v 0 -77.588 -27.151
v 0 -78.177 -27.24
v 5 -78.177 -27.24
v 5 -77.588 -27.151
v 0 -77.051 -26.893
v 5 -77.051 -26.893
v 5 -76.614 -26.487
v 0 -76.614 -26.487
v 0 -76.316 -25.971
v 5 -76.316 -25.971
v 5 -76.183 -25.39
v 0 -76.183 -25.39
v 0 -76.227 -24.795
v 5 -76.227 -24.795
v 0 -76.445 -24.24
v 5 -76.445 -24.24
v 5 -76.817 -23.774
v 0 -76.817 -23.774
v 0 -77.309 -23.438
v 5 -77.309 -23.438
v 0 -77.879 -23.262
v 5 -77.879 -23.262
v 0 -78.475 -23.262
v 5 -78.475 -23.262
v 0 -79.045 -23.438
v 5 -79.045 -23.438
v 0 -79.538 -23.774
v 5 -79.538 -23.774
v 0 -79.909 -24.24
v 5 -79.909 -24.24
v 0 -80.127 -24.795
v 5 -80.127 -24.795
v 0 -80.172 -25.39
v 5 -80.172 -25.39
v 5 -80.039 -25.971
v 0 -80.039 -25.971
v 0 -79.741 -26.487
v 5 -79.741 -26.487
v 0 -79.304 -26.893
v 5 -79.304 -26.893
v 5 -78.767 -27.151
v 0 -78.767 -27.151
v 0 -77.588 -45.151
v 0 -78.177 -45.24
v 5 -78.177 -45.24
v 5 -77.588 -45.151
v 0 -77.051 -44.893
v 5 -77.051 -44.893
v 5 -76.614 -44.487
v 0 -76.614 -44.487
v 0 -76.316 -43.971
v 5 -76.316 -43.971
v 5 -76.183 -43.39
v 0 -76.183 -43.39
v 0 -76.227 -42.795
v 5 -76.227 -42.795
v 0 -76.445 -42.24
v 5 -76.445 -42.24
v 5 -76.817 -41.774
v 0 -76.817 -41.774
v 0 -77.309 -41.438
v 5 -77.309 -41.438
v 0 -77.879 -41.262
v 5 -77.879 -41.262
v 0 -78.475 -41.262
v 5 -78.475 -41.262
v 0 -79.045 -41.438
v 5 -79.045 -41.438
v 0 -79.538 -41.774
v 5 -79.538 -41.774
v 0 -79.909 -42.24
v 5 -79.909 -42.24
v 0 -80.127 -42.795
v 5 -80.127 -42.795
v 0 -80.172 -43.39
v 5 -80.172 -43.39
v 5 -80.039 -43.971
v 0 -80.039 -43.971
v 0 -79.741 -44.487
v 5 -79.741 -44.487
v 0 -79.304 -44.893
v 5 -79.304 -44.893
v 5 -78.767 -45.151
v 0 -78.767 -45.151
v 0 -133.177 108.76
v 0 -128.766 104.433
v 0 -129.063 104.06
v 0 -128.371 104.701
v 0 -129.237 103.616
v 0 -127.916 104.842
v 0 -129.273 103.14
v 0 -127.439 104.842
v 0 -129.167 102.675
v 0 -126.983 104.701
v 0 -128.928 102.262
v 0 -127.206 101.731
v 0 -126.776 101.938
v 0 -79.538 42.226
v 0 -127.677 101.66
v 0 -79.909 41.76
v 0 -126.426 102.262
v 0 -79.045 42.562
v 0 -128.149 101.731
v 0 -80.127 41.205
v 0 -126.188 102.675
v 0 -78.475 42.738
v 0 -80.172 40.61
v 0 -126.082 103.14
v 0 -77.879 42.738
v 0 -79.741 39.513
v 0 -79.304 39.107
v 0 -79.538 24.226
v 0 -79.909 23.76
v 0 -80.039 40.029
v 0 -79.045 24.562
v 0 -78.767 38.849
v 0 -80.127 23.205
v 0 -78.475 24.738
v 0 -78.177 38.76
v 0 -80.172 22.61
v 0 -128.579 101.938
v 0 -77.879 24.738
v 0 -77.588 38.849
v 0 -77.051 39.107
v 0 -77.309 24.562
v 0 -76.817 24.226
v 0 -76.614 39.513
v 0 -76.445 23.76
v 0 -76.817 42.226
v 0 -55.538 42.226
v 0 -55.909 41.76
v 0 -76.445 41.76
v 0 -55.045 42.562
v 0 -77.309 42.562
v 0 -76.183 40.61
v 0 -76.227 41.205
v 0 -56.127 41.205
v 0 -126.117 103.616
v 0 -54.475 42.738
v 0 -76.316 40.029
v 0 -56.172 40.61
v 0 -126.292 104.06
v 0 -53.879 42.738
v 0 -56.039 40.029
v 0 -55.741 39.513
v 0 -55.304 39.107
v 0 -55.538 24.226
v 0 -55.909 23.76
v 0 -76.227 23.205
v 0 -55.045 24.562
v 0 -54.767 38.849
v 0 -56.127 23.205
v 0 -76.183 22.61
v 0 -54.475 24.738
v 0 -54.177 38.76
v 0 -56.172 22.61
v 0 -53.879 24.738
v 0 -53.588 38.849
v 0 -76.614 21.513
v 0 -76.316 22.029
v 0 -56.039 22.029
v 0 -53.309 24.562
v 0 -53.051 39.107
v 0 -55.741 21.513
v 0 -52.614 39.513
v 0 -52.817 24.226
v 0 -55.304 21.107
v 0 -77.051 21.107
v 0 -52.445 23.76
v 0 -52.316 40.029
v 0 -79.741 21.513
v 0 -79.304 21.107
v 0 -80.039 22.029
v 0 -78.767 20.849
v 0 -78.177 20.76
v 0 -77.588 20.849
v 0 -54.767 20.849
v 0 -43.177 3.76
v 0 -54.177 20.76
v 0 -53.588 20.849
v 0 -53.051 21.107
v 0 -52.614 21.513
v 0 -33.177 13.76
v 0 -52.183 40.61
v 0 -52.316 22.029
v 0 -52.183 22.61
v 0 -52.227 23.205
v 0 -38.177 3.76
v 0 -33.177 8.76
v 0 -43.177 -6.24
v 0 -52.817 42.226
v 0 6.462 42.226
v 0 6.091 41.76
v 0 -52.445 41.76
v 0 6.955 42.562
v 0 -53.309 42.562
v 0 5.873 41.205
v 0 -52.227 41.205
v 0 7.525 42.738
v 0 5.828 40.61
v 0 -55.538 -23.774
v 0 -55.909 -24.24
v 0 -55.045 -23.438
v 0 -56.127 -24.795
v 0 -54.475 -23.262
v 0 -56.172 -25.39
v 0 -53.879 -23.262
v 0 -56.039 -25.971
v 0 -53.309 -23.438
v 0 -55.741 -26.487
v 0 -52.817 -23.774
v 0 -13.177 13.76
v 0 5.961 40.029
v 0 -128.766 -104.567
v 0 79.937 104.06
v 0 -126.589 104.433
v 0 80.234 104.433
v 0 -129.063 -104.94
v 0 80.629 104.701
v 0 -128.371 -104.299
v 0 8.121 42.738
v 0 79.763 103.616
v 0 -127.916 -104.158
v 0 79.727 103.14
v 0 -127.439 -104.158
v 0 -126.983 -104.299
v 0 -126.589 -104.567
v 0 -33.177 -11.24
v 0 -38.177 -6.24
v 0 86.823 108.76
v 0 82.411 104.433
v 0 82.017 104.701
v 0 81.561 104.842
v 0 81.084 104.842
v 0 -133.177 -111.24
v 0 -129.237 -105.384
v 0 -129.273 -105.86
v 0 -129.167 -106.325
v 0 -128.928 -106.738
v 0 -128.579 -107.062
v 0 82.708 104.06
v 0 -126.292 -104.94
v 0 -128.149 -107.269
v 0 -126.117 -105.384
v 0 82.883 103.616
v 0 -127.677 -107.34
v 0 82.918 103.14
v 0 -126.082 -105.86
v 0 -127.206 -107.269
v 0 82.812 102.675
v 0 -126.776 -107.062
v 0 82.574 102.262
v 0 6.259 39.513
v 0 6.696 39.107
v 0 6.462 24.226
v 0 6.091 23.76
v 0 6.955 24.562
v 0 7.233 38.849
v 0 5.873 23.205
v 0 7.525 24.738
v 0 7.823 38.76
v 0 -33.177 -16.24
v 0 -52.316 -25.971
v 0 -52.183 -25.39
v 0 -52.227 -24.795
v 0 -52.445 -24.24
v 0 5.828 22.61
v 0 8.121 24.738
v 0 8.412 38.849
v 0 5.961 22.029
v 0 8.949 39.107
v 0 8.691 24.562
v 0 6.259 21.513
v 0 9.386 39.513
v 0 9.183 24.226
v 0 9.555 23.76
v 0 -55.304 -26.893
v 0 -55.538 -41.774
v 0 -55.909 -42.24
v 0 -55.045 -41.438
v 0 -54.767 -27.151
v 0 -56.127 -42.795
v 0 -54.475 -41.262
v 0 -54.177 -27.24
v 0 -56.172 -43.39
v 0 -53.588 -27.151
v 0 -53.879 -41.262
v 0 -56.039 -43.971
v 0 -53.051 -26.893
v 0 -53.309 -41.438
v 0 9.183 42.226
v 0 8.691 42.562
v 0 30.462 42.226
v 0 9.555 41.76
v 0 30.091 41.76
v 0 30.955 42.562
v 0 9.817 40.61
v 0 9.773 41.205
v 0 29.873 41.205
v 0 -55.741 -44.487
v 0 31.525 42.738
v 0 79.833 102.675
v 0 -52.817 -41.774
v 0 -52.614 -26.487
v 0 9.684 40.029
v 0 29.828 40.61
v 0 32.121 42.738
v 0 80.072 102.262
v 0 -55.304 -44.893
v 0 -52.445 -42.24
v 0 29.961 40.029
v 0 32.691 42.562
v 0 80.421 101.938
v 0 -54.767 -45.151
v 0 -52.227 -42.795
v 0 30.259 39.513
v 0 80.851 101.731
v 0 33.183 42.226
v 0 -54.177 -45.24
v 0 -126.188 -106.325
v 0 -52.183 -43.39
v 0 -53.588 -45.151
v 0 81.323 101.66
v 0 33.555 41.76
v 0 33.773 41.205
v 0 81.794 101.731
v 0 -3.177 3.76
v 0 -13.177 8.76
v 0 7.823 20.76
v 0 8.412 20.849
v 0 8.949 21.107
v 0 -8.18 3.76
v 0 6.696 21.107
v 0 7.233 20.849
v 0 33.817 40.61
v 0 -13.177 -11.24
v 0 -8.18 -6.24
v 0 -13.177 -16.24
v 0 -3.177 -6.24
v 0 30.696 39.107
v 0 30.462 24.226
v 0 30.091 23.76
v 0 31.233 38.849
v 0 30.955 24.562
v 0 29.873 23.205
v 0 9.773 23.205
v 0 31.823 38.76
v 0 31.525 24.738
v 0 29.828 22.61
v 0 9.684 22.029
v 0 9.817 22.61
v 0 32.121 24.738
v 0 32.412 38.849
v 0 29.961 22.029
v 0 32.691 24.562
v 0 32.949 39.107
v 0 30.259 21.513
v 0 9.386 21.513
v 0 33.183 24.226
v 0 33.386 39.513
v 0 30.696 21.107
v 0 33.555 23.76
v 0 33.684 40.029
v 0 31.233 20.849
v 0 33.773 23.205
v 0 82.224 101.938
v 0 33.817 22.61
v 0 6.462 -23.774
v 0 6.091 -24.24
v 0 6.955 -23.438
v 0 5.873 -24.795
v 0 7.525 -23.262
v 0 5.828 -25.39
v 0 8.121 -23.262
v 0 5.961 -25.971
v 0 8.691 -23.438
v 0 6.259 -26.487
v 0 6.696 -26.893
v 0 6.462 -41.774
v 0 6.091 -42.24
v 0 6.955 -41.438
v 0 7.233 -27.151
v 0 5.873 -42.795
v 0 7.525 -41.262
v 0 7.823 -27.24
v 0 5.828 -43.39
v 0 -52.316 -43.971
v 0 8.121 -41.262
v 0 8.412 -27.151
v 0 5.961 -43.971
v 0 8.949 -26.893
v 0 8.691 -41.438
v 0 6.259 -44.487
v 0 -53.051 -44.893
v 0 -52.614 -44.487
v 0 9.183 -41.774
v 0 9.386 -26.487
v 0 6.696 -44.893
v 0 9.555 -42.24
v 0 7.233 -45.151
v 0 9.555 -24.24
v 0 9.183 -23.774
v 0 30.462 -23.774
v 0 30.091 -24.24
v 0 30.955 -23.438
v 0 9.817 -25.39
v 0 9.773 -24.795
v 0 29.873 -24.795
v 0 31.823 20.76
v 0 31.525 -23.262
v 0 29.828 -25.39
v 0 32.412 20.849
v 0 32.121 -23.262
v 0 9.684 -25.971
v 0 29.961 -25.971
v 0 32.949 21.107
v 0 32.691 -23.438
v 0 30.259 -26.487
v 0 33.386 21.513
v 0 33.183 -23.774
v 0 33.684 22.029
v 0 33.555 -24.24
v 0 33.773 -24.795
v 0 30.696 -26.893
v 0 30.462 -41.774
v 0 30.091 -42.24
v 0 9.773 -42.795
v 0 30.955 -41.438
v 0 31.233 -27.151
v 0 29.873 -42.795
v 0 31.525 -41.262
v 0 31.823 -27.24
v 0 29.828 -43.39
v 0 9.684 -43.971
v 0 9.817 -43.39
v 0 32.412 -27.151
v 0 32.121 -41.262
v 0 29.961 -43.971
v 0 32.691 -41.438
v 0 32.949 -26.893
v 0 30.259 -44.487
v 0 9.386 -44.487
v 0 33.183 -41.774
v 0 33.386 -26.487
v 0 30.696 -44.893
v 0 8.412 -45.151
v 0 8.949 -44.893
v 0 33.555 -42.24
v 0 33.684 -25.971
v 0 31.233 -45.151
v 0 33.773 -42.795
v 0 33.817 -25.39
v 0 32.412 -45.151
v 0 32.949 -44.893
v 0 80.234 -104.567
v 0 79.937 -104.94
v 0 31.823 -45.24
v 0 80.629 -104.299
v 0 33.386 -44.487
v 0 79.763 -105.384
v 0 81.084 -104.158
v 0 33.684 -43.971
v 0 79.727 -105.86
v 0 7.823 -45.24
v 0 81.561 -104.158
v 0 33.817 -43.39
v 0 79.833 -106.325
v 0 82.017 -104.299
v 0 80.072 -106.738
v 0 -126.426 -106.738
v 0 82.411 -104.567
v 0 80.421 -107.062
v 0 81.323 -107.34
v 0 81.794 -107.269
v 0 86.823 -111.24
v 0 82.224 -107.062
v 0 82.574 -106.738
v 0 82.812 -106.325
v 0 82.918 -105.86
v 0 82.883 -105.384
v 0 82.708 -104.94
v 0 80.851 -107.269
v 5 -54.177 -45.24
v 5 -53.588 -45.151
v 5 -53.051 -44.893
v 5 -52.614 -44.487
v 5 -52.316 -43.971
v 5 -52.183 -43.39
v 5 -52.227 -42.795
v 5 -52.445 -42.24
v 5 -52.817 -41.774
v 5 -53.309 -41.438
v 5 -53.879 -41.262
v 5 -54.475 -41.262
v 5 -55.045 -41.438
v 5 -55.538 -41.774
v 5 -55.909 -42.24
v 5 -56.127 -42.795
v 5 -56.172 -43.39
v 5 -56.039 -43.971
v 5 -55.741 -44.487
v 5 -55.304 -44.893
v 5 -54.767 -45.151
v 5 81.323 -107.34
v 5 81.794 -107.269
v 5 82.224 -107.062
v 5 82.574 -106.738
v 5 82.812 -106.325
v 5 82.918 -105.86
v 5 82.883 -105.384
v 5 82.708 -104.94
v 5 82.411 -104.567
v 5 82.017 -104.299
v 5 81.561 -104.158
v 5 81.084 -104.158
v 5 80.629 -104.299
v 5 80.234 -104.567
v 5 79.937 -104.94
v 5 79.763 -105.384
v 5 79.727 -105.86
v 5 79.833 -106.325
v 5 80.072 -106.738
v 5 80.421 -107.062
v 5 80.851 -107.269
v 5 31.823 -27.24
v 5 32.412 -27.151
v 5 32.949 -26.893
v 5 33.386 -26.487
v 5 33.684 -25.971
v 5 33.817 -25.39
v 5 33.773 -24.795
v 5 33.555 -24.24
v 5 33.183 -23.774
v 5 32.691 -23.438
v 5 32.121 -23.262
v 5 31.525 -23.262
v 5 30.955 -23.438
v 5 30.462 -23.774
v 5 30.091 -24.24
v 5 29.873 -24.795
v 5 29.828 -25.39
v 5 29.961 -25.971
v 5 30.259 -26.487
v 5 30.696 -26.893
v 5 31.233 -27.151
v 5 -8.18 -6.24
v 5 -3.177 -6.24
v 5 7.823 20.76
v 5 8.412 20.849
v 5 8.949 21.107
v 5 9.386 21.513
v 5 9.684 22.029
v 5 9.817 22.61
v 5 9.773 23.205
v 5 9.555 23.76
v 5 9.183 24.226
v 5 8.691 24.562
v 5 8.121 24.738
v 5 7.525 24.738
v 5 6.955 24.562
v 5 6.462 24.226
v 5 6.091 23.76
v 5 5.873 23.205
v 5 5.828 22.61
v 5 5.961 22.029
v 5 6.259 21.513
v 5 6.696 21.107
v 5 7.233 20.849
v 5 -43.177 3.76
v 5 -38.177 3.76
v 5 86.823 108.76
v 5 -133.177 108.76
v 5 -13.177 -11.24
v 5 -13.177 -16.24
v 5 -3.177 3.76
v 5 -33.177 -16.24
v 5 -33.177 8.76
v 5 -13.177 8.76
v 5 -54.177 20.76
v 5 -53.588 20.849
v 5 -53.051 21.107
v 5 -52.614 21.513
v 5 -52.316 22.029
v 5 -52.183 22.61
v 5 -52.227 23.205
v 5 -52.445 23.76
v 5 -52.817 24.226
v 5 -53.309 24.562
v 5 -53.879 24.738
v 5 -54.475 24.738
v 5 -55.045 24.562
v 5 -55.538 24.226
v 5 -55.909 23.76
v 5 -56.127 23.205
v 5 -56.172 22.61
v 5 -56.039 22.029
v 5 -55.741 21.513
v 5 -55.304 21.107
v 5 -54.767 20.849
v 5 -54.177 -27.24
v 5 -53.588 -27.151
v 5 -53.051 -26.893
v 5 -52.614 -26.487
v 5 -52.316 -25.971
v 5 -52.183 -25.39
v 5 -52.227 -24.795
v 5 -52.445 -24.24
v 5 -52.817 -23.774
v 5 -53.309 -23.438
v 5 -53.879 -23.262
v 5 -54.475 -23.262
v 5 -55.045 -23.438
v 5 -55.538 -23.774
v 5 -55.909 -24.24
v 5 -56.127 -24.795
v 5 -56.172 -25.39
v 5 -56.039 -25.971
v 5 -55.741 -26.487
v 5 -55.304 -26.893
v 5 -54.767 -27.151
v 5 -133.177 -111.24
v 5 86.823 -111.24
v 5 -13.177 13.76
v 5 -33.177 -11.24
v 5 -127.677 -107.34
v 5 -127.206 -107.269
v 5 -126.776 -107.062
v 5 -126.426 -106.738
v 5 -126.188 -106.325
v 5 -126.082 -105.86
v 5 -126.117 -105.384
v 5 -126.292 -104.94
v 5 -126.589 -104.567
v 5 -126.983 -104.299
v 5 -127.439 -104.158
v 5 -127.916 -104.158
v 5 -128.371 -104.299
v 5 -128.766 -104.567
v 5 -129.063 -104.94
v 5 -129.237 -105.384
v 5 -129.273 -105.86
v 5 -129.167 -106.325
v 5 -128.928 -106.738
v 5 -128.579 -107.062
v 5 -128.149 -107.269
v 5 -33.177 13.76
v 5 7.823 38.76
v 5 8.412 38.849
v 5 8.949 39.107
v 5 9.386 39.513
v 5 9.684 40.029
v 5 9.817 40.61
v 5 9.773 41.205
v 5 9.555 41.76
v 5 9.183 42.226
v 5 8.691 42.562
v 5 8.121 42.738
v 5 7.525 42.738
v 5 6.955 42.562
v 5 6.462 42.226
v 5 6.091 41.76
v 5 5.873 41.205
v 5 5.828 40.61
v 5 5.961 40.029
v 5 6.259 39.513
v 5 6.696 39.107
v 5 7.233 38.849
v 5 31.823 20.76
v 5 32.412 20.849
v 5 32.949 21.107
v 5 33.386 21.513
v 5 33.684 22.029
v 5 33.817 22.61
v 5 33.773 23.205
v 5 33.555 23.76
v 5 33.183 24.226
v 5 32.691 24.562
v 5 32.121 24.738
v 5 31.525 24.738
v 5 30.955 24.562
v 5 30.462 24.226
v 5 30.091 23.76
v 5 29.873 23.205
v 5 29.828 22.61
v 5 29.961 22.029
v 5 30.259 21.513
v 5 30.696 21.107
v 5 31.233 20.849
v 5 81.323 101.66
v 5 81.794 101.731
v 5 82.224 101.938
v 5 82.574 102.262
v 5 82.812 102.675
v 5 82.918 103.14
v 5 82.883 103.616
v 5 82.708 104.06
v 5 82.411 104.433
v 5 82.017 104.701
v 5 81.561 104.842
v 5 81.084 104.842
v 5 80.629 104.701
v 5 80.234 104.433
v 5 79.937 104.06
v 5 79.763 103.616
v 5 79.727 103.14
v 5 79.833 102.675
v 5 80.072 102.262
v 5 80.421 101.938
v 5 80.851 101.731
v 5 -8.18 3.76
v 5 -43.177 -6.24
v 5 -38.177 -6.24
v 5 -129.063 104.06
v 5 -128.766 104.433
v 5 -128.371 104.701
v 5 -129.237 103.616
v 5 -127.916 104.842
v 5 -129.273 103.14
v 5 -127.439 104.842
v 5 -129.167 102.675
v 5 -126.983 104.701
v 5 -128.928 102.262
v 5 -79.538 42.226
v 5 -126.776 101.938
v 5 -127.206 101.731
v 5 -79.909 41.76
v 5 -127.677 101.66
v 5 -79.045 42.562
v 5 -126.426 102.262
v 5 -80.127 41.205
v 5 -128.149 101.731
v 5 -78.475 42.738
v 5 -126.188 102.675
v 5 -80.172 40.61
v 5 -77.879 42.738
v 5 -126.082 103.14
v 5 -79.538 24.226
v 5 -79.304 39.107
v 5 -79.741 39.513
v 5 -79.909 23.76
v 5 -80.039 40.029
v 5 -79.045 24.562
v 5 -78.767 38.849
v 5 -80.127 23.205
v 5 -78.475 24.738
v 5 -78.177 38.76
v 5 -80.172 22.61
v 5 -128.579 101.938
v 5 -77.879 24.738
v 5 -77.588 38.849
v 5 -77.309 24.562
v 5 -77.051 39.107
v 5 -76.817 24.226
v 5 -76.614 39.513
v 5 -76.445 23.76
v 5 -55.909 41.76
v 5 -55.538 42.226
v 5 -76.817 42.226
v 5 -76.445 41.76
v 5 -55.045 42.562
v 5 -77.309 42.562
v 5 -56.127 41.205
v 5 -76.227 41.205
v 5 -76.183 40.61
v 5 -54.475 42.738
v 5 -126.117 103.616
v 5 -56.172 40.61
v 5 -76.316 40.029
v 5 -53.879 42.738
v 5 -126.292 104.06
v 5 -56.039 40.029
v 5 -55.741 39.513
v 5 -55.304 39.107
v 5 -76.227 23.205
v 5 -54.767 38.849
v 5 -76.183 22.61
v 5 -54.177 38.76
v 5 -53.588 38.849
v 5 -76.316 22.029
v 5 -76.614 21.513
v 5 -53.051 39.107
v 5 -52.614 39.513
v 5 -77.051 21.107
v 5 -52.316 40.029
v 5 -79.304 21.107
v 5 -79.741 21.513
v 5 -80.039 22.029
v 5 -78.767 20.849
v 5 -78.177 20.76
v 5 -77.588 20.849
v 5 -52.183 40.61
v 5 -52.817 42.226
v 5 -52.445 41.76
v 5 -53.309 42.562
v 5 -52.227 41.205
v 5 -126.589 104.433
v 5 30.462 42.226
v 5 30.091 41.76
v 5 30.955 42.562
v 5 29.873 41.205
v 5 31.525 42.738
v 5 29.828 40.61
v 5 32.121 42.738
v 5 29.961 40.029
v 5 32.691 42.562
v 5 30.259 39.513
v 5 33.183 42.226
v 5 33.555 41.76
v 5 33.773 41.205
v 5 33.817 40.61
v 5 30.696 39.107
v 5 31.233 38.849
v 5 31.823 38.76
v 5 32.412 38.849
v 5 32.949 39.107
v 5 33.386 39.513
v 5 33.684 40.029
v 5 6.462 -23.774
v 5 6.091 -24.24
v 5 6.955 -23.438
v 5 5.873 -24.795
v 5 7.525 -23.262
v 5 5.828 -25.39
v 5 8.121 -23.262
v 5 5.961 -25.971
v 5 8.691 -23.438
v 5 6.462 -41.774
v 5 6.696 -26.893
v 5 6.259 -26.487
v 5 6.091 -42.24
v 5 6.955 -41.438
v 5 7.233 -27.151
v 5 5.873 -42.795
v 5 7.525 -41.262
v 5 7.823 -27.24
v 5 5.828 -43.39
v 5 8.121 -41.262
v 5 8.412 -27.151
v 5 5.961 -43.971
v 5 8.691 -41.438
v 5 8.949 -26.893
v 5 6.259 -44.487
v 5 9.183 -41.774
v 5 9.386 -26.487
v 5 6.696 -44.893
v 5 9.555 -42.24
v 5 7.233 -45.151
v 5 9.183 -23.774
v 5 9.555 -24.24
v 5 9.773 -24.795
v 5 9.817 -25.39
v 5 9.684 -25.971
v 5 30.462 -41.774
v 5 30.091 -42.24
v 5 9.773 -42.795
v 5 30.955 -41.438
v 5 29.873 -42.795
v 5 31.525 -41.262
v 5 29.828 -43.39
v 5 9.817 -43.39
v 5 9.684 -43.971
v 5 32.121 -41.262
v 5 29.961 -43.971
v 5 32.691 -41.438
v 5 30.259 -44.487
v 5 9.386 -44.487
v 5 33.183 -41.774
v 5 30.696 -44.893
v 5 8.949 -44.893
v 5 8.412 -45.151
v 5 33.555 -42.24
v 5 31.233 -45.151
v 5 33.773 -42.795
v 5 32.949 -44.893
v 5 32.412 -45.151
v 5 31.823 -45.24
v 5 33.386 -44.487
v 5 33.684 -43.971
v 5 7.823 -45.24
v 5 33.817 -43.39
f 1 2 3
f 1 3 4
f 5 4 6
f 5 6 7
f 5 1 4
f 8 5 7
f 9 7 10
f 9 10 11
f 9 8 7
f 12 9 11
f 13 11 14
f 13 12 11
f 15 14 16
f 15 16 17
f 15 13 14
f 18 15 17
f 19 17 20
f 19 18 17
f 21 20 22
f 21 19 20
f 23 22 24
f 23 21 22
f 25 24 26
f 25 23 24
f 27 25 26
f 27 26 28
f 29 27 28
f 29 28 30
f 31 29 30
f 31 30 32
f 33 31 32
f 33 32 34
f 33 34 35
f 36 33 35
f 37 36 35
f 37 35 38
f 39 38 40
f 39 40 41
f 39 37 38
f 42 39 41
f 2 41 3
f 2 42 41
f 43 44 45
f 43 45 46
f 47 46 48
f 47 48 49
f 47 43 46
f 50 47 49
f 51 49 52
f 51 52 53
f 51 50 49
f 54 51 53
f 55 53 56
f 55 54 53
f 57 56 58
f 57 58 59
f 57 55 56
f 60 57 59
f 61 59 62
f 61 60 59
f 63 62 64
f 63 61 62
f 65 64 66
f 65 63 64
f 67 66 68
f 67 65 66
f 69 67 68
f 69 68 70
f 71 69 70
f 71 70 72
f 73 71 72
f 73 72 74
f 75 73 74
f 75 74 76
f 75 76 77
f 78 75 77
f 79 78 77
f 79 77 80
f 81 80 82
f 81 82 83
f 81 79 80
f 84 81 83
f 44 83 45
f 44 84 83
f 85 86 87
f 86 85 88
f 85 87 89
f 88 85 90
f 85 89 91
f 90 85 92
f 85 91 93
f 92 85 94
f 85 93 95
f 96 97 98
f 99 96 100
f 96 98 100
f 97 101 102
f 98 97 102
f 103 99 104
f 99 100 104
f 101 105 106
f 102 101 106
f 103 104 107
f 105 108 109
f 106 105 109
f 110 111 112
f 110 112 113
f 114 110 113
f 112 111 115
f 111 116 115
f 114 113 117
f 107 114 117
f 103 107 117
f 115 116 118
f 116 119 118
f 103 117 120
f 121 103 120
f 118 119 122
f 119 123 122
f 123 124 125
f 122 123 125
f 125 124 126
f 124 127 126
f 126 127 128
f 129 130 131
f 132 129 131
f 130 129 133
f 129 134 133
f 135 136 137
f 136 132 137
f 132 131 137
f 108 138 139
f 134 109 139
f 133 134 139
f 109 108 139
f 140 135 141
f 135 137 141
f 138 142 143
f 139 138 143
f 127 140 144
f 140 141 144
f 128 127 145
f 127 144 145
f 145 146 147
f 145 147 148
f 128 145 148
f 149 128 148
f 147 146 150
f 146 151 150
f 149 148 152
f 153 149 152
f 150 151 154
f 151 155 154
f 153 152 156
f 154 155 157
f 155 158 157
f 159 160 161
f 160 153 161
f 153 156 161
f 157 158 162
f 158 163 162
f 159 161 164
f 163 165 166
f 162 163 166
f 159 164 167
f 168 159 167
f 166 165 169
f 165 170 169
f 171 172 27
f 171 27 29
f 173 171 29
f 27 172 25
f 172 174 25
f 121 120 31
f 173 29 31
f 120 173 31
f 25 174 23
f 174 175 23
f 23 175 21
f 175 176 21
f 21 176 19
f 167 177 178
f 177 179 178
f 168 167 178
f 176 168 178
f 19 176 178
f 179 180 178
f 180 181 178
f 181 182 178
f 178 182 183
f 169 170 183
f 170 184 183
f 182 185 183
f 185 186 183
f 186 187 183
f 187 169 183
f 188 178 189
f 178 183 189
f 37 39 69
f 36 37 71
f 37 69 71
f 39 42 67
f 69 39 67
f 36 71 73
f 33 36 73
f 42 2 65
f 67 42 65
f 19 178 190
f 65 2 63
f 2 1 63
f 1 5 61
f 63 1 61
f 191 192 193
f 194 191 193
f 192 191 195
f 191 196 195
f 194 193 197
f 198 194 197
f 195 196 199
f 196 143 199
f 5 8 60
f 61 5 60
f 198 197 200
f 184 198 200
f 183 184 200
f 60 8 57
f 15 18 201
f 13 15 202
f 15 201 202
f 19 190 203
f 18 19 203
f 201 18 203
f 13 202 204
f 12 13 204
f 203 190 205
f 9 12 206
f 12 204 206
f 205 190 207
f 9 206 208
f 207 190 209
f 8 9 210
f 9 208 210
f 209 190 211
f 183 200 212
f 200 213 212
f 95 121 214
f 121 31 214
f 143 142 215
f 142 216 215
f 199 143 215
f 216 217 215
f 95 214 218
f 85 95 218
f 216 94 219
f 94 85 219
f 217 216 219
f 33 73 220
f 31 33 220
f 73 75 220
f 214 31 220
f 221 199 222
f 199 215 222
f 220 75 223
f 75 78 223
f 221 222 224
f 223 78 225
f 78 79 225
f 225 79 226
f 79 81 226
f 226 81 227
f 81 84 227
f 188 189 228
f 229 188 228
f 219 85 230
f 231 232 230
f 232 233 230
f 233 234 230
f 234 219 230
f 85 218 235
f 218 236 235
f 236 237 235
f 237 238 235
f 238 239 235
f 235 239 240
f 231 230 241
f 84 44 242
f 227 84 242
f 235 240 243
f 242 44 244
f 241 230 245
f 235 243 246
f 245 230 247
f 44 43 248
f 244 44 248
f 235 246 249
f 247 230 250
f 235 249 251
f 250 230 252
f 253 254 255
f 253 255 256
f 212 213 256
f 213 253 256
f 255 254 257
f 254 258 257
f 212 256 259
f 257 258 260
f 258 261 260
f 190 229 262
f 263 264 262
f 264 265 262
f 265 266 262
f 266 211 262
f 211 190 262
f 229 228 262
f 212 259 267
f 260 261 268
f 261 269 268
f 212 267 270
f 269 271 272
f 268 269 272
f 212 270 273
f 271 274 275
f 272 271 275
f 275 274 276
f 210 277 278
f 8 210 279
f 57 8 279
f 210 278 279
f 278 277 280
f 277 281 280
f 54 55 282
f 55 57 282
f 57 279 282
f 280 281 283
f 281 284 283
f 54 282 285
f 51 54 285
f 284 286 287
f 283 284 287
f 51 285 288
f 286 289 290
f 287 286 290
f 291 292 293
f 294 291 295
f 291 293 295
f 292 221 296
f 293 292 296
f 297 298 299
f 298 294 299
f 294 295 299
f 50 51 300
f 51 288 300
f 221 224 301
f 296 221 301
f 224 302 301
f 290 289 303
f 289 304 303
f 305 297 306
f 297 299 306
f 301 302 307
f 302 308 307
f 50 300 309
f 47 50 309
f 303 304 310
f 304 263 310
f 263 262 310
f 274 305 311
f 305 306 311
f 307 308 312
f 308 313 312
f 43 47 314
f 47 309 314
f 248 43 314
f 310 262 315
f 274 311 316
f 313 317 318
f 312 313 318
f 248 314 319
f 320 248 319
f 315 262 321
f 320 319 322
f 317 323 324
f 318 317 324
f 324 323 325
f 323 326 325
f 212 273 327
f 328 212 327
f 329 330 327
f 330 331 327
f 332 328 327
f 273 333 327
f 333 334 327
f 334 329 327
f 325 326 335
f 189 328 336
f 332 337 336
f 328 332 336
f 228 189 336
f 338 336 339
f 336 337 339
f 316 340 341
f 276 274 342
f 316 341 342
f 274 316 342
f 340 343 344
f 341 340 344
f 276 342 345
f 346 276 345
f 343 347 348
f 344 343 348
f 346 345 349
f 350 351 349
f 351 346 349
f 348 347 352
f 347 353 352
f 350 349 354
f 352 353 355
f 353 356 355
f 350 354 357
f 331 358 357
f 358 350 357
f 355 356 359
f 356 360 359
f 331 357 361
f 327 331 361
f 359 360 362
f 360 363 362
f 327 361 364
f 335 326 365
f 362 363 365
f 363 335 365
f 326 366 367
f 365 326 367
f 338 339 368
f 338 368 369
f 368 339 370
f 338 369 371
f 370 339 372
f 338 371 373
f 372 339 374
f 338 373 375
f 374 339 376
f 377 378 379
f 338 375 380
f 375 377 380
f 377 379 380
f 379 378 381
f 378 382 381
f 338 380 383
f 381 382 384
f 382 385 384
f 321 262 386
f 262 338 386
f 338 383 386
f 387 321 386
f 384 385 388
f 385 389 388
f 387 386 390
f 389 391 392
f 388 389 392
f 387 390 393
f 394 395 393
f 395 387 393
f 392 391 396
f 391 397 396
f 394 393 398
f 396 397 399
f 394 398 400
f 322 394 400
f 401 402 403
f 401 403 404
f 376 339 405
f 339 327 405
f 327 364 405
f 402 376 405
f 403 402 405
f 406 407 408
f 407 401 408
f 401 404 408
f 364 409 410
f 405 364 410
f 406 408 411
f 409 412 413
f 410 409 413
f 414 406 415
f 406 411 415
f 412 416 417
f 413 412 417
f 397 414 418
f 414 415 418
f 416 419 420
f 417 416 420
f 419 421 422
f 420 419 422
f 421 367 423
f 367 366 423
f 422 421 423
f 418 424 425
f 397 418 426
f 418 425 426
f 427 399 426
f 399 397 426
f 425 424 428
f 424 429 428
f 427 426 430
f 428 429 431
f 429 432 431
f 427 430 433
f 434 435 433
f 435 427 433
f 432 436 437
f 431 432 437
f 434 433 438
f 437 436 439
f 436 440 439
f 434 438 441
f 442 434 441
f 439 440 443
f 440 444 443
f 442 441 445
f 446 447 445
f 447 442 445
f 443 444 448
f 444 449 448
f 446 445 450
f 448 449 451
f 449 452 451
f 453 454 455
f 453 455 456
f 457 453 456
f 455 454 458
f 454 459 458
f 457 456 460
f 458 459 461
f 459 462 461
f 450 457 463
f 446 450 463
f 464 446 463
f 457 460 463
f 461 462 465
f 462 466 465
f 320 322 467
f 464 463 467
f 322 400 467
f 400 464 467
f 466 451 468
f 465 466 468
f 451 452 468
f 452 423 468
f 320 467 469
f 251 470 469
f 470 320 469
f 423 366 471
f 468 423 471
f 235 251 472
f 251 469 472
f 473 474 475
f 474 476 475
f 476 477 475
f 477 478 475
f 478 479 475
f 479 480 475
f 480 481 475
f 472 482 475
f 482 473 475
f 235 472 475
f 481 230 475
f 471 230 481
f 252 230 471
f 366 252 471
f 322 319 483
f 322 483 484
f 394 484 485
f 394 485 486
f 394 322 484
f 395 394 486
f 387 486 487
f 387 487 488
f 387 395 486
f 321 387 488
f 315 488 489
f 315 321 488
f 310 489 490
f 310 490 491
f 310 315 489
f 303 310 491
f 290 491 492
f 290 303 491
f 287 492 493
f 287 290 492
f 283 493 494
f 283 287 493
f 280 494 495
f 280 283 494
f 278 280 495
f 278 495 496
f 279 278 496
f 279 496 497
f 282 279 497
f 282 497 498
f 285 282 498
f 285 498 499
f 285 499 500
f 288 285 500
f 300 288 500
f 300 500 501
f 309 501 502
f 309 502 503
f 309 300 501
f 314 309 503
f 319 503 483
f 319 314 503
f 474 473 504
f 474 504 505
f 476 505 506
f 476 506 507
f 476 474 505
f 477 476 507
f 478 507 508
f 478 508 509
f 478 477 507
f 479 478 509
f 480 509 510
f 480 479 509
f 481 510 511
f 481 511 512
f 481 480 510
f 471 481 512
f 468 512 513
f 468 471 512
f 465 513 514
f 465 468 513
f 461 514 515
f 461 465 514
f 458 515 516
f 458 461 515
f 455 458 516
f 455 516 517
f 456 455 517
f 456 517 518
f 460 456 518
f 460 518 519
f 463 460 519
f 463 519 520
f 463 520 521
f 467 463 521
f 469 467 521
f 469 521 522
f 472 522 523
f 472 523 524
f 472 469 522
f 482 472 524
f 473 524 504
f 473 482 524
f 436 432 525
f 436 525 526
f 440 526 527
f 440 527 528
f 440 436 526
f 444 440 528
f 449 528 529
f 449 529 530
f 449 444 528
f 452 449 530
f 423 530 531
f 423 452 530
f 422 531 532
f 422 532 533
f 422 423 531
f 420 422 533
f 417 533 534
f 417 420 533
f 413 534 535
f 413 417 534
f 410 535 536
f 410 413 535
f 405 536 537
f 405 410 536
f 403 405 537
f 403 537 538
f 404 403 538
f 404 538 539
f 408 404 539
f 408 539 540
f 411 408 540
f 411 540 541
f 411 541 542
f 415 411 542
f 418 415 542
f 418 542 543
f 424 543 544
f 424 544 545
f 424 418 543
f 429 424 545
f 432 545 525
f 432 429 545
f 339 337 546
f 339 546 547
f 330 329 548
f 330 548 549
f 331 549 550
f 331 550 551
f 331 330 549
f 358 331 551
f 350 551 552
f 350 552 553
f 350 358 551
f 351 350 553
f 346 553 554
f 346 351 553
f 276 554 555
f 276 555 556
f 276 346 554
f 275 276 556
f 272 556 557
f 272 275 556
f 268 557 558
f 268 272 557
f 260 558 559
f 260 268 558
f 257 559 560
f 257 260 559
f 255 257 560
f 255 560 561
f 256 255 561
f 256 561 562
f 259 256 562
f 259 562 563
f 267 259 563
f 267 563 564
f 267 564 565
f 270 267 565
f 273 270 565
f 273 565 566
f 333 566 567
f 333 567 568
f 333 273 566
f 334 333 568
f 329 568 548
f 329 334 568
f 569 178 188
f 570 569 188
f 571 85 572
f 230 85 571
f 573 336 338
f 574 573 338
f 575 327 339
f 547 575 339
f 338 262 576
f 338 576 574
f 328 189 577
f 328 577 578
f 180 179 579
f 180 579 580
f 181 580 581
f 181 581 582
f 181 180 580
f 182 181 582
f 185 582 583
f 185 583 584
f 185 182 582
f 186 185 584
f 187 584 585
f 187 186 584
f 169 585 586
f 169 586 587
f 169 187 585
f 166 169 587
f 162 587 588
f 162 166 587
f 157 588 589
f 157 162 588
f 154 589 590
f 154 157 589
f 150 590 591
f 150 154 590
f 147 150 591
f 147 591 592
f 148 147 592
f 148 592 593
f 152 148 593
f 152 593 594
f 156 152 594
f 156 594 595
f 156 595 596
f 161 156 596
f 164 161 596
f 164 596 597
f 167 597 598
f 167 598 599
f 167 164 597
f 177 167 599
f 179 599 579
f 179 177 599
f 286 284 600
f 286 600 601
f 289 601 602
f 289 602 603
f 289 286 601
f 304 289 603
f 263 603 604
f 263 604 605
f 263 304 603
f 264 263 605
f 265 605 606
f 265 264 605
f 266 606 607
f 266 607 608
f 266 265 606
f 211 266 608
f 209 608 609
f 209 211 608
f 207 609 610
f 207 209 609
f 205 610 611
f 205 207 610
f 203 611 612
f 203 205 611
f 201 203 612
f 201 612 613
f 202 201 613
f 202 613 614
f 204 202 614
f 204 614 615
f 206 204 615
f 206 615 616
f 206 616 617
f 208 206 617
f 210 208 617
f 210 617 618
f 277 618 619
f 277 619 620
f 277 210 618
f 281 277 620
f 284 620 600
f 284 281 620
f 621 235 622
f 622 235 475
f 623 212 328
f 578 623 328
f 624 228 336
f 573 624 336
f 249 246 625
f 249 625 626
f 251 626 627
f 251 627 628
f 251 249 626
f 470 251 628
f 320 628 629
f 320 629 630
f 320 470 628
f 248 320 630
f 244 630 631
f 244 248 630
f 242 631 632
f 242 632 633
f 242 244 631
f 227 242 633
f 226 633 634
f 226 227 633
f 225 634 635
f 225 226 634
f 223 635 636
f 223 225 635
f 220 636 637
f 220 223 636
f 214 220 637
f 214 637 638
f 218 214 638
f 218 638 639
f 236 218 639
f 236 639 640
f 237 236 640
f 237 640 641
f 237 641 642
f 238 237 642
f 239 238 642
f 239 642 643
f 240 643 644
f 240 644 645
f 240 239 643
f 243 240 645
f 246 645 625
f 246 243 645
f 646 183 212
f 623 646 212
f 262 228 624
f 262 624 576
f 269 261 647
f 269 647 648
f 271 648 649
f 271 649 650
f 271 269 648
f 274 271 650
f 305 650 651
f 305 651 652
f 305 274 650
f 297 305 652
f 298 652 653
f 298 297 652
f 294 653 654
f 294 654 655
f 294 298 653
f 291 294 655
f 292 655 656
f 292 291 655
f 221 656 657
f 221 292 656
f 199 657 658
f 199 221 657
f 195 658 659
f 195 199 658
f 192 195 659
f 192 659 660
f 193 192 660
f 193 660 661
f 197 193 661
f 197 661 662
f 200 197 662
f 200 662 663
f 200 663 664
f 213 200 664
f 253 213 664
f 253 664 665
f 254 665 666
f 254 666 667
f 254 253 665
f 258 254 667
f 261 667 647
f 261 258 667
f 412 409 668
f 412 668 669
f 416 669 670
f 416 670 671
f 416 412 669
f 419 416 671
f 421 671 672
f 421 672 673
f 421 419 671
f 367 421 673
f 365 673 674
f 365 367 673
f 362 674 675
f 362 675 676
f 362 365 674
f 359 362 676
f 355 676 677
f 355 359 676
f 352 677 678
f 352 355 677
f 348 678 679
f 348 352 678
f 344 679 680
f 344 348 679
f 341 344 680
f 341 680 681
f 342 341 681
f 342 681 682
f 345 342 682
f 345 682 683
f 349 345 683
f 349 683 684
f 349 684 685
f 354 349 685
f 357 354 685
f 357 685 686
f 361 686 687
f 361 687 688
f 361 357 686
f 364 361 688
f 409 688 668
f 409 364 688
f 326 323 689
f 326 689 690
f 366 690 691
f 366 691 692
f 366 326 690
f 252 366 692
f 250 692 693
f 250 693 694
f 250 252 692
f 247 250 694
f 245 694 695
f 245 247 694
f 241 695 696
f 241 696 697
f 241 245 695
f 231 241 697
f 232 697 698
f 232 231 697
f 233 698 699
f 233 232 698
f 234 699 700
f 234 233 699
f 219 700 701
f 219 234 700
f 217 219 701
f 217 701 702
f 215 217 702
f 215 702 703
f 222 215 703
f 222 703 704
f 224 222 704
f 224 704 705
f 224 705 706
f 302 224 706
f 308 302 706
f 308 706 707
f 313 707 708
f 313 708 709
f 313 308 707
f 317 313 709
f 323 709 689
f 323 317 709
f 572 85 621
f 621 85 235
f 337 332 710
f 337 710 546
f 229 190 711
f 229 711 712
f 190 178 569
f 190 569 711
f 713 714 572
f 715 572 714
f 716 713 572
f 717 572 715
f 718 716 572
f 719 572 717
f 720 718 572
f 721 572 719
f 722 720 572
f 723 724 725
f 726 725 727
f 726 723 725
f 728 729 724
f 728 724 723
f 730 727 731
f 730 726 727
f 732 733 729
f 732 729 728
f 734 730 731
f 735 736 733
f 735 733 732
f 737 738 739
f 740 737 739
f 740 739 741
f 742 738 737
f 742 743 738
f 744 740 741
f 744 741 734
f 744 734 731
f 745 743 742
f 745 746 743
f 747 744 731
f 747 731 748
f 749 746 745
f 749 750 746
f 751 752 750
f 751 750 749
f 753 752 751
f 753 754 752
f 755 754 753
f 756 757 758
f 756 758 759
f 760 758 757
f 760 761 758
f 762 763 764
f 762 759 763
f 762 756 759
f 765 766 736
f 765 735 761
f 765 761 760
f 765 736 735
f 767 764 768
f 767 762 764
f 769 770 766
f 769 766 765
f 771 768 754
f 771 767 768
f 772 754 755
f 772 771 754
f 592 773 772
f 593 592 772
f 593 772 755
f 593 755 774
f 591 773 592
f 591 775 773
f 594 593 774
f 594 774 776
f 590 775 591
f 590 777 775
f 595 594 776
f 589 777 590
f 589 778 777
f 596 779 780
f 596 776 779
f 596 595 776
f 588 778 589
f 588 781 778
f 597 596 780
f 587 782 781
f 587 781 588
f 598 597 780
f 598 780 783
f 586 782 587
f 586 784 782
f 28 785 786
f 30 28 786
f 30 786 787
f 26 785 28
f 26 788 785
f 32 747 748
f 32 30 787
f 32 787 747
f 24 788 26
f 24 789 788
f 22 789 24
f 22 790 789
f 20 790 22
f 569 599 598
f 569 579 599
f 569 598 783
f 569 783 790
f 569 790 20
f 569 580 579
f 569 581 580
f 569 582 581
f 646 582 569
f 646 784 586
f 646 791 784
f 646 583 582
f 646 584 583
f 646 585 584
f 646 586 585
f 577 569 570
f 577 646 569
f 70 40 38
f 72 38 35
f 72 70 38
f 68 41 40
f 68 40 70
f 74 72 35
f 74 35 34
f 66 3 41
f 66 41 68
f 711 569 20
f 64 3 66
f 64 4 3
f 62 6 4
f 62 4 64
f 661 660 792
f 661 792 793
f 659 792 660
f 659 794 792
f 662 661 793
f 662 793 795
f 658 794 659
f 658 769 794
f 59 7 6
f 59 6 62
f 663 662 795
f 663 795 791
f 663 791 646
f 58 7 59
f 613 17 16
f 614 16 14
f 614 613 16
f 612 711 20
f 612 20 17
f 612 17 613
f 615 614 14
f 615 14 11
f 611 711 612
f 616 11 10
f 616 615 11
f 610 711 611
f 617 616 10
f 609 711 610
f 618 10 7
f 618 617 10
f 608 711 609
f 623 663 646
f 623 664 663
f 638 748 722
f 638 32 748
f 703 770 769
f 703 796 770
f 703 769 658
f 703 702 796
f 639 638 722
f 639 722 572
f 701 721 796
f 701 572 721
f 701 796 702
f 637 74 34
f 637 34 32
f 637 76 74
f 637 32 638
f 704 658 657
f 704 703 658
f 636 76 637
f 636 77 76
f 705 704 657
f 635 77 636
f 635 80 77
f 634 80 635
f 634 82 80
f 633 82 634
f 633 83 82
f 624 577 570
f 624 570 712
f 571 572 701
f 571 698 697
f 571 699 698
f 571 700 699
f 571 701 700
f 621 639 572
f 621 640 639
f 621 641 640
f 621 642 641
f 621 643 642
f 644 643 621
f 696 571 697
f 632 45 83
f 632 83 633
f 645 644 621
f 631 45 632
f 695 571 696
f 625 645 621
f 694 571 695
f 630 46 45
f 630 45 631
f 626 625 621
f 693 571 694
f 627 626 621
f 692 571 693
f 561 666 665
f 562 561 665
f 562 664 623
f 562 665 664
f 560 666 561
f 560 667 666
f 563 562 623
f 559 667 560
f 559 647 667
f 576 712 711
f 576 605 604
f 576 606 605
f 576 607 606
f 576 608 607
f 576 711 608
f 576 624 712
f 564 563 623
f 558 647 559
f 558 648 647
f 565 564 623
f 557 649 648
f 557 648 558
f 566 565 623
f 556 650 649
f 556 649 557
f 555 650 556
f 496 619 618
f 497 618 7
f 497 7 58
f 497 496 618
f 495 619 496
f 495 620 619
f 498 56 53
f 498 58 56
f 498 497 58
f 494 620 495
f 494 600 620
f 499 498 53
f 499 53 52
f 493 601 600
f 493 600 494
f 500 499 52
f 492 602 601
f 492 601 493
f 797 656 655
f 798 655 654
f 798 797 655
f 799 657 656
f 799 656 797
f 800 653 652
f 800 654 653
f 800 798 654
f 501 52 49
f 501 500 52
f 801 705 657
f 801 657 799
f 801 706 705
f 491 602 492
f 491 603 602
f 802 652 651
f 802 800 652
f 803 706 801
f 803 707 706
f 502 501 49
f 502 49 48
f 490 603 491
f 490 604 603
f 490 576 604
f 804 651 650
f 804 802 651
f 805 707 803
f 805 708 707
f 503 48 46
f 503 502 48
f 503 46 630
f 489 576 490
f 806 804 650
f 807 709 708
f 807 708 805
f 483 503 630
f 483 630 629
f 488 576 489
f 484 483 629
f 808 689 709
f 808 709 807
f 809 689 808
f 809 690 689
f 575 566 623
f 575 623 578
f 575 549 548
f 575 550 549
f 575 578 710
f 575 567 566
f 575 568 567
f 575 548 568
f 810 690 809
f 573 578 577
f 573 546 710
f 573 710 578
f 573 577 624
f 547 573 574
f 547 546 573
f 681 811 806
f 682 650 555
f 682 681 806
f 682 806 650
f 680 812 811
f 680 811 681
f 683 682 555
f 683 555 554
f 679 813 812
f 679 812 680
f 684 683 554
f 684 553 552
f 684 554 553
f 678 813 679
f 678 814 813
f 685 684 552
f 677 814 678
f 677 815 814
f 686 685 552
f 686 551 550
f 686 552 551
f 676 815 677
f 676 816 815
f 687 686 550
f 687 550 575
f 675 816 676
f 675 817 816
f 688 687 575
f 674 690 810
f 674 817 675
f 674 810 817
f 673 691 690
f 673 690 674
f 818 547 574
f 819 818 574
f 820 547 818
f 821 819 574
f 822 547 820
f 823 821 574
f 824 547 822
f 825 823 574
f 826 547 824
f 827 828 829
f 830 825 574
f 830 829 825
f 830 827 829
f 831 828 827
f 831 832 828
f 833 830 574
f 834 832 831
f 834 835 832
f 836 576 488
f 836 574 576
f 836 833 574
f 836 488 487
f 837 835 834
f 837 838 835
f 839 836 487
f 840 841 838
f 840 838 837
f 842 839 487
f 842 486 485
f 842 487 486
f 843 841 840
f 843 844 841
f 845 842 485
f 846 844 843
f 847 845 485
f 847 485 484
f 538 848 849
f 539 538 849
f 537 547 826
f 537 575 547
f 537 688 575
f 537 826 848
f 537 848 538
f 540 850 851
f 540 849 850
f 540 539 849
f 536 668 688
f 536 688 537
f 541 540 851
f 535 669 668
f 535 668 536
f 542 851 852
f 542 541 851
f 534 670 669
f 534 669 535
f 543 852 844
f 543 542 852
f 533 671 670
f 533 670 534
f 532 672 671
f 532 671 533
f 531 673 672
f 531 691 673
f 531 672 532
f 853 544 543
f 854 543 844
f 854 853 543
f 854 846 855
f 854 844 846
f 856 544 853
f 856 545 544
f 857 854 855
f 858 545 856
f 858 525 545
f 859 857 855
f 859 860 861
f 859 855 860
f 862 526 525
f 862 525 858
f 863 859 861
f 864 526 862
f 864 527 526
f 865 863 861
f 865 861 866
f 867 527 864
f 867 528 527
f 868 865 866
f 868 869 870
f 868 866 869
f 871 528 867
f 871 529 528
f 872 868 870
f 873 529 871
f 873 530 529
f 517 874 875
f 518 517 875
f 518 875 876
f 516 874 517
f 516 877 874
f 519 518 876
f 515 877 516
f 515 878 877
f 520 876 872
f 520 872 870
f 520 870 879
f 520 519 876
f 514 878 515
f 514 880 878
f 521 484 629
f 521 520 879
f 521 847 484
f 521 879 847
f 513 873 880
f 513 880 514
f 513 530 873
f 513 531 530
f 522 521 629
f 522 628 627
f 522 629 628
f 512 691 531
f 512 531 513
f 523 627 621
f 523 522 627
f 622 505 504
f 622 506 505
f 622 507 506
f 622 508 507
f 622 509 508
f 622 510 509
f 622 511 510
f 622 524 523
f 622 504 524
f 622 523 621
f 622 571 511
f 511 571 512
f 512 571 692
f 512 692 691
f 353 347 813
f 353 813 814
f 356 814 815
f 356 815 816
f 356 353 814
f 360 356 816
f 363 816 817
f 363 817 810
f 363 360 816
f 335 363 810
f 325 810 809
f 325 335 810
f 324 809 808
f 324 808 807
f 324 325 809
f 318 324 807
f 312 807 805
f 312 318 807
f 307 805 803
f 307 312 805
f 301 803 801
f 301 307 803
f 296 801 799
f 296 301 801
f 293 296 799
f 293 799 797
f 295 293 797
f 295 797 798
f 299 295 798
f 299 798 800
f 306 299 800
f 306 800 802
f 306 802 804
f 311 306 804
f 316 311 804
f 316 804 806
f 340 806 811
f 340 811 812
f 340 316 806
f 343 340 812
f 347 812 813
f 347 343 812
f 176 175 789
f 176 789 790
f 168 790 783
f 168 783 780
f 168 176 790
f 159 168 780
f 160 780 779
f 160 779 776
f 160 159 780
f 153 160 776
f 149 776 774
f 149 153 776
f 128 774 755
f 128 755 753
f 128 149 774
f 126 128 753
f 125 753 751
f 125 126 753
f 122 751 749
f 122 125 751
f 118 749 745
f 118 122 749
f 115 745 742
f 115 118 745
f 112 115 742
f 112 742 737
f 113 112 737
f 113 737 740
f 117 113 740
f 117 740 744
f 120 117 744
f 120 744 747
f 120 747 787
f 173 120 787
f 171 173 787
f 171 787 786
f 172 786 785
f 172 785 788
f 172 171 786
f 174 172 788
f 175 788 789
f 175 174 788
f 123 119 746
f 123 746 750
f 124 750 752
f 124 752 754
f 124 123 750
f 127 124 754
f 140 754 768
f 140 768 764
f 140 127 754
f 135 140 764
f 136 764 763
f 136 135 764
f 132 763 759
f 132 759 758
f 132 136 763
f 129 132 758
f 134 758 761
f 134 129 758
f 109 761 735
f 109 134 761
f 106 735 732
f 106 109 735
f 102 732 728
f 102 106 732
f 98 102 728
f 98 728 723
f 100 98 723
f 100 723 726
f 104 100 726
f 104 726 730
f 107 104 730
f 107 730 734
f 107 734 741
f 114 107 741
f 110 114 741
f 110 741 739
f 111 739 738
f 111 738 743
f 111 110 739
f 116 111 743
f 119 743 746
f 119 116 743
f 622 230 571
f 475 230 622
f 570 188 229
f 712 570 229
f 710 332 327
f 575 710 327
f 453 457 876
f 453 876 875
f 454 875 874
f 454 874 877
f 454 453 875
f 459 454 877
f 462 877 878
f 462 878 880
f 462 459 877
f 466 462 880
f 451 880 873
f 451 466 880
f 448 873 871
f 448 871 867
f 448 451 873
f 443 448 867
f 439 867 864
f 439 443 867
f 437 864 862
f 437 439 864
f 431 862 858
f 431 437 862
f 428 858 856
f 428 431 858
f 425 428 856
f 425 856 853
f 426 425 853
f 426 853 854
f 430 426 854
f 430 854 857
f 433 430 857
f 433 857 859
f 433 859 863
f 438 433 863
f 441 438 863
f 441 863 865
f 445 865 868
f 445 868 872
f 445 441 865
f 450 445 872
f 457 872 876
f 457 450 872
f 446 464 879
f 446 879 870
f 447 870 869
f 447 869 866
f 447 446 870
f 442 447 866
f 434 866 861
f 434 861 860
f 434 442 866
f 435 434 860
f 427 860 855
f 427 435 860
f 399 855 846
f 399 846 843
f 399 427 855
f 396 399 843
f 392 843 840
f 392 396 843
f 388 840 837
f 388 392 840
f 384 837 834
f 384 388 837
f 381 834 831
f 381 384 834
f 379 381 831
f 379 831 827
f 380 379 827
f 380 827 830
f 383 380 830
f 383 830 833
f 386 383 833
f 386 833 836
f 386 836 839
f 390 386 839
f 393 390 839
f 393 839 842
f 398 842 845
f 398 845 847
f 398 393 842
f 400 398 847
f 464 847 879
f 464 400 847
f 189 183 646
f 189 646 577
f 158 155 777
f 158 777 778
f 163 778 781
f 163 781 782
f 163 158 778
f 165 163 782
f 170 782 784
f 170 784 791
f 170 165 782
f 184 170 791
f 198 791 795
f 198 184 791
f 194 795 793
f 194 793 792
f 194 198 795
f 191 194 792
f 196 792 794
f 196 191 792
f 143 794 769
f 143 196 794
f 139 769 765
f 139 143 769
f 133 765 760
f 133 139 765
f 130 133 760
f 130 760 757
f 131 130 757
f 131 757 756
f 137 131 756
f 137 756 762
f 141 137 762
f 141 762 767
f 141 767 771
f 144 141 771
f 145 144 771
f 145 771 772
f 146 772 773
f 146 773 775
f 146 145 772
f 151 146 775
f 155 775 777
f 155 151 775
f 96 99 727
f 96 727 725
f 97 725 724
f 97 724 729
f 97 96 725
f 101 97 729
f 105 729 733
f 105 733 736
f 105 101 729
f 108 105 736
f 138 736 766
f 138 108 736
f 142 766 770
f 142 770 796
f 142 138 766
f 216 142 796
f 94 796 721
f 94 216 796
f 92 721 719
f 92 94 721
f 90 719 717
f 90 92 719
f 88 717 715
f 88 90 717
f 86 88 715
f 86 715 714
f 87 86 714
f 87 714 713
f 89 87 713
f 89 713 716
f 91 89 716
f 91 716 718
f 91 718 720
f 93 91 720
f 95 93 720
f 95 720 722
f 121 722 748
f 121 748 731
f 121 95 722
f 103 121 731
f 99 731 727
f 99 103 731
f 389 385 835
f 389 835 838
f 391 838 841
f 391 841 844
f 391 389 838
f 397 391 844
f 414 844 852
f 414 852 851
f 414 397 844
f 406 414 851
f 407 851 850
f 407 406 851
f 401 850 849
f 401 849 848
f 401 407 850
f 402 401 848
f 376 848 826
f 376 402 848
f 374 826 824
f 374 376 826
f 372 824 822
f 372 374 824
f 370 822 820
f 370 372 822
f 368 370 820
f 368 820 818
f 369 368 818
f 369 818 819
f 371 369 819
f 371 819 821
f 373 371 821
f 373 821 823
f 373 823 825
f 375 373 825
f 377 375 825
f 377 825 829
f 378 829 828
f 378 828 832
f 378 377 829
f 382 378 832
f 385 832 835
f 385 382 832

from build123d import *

# Parameters (mm, degrees)
SKETCH_1_W      = 220
SKETCH_1_H      = 220
SKETCH_1_R      = 2
SKETCH_1_R_2    = 1.6
SKETCH_1_W_2    = 5
SKETCH_1_H_2    = 20
SKETCH_1_W_3    = 10
SKETCH_1_H_3    = 5.002557866
SKETCH_1_H_4    = 5
EXTRUDE_1_DEPTH = 5


with BuildPart() as part:
    # 草图1 → 凸台-拉伸1 (new body)
    with BuildSketch(Plane(origin=(0, 0, 0), x_dir=(0, 0, -1), z_dir=(1, 0, 0))):
        with Locations((1.240063593, -23.177255758)):
            Rectangle(SKETCH_1_W, SKETCH_1_H)
        with Locations((-22.759936407, 7.822744242)):
            Circle(SKETCH_1_R, mode=Mode.SUBTRACT)
        with Locations((-40.759936407, 7.822744242)):
            Circle(SKETCH_1_R, mode=Mode.SUBTRACT)
        with Locations((-40.759936407, 31.822744242)):
            Circle(SKETCH_1_R, mode=Mode.SUBTRACT)
        with Locations((-22.759936407, 31.822744242)):
            Circle(SKETCH_1_R, mode=Mode.SUBTRACT)
        with Locations((-22.759936407, -78.177255758)):
            Circle(SKETCH_1_R, mode=Mode.SUBTRACT)
        with Locations((-40.759936407, -78.177255758)):
            Circle(SKETCH_1_R, mode=Mode.SUBTRACT)
        with Locations((-40.759936407, -54.177255758)):
            Circle(SKETCH_1_R, mode=Mode.SUBTRACT)
        with Locations((-22.759936407, -54.177255758)):
            Circle(SKETCH_1_R, mode=Mode.SUBTRACT)
        with Locations((43.240063593, 7.822744242)):
            Circle(SKETCH_1_R, mode=Mode.SUBTRACT)
        with Locations((25.240063593, 7.822744242)):
            Circle(SKETCH_1_R, mode=Mode.SUBTRACT)
        with Locations((25.240063593, 31.822744242)):
            Circle(SKETCH_1_R, mode=Mode.SUBTRACT)
        with Locations((43.240063593, 31.822744242)):
            Circle(SKETCH_1_R, mode=Mode.SUBTRACT)
        with Locations((43.240063593, -78.177255758)):
            Circle(SKETCH_1_R, mode=Mode.SUBTRACT)
        with Locations((25.240063593, -78.177255758)):
            Circle(SKETCH_1_R, mode=Mode.SUBTRACT)
        with Locations((25.240063593, -54.177255758)):
            Circle(SKETCH_1_R, mode=Mode.SUBTRACT)
        with Locations((43.240063593, -54.177255758)):
            Circle(SKETCH_1_R, mode=Mode.SUBTRACT)
        with Locations((105.740063593, 81.322744242)):
            Circle(SKETCH_1_R_2, mode=Mode.SUBTRACT)
        with Locations((-103.259936407, 81.322744242)):
            Circle(SKETCH_1_R_2, mode=Mode.SUBTRACT)
        with Locations((-103.259936407, -127.677255758)):
            Circle(SKETCH_1_R_2, mode=Mode.SUBTRACT)
        with Locations((105.740063593, -127.677255758)):
            Circle(SKETCH_1_R_2, mode=Mode.SUBTRACT)
        with Locations((13.740063593, -23.177255758)):
            Rectangle(SKETCH_1_W_2, SKETCH_1_H_2, mode=Mode.SUBTRACT)
        with Locations((-11.259936407, -23.177255758)):
            Rectangle(SKETCH_1_W_2, SKETCH_1_H_2, mode=Mode.SUBTRACT)
        with Locations((1.240063593, -5.678534691)):
            Rectangle(SKETCH_1_W_3, SKETCH_1_H_3, mode=Mode.SUBTRACT)
        with Locations((1.240063593, -40.677255758)):
            Rectangle(SKETCH_1_W_3, SKETCH_1_H_4, mode=Mode.SUBTRACT)
    extrude(amount=EXTRUDE_1_DEPTH)


solid = part.part
